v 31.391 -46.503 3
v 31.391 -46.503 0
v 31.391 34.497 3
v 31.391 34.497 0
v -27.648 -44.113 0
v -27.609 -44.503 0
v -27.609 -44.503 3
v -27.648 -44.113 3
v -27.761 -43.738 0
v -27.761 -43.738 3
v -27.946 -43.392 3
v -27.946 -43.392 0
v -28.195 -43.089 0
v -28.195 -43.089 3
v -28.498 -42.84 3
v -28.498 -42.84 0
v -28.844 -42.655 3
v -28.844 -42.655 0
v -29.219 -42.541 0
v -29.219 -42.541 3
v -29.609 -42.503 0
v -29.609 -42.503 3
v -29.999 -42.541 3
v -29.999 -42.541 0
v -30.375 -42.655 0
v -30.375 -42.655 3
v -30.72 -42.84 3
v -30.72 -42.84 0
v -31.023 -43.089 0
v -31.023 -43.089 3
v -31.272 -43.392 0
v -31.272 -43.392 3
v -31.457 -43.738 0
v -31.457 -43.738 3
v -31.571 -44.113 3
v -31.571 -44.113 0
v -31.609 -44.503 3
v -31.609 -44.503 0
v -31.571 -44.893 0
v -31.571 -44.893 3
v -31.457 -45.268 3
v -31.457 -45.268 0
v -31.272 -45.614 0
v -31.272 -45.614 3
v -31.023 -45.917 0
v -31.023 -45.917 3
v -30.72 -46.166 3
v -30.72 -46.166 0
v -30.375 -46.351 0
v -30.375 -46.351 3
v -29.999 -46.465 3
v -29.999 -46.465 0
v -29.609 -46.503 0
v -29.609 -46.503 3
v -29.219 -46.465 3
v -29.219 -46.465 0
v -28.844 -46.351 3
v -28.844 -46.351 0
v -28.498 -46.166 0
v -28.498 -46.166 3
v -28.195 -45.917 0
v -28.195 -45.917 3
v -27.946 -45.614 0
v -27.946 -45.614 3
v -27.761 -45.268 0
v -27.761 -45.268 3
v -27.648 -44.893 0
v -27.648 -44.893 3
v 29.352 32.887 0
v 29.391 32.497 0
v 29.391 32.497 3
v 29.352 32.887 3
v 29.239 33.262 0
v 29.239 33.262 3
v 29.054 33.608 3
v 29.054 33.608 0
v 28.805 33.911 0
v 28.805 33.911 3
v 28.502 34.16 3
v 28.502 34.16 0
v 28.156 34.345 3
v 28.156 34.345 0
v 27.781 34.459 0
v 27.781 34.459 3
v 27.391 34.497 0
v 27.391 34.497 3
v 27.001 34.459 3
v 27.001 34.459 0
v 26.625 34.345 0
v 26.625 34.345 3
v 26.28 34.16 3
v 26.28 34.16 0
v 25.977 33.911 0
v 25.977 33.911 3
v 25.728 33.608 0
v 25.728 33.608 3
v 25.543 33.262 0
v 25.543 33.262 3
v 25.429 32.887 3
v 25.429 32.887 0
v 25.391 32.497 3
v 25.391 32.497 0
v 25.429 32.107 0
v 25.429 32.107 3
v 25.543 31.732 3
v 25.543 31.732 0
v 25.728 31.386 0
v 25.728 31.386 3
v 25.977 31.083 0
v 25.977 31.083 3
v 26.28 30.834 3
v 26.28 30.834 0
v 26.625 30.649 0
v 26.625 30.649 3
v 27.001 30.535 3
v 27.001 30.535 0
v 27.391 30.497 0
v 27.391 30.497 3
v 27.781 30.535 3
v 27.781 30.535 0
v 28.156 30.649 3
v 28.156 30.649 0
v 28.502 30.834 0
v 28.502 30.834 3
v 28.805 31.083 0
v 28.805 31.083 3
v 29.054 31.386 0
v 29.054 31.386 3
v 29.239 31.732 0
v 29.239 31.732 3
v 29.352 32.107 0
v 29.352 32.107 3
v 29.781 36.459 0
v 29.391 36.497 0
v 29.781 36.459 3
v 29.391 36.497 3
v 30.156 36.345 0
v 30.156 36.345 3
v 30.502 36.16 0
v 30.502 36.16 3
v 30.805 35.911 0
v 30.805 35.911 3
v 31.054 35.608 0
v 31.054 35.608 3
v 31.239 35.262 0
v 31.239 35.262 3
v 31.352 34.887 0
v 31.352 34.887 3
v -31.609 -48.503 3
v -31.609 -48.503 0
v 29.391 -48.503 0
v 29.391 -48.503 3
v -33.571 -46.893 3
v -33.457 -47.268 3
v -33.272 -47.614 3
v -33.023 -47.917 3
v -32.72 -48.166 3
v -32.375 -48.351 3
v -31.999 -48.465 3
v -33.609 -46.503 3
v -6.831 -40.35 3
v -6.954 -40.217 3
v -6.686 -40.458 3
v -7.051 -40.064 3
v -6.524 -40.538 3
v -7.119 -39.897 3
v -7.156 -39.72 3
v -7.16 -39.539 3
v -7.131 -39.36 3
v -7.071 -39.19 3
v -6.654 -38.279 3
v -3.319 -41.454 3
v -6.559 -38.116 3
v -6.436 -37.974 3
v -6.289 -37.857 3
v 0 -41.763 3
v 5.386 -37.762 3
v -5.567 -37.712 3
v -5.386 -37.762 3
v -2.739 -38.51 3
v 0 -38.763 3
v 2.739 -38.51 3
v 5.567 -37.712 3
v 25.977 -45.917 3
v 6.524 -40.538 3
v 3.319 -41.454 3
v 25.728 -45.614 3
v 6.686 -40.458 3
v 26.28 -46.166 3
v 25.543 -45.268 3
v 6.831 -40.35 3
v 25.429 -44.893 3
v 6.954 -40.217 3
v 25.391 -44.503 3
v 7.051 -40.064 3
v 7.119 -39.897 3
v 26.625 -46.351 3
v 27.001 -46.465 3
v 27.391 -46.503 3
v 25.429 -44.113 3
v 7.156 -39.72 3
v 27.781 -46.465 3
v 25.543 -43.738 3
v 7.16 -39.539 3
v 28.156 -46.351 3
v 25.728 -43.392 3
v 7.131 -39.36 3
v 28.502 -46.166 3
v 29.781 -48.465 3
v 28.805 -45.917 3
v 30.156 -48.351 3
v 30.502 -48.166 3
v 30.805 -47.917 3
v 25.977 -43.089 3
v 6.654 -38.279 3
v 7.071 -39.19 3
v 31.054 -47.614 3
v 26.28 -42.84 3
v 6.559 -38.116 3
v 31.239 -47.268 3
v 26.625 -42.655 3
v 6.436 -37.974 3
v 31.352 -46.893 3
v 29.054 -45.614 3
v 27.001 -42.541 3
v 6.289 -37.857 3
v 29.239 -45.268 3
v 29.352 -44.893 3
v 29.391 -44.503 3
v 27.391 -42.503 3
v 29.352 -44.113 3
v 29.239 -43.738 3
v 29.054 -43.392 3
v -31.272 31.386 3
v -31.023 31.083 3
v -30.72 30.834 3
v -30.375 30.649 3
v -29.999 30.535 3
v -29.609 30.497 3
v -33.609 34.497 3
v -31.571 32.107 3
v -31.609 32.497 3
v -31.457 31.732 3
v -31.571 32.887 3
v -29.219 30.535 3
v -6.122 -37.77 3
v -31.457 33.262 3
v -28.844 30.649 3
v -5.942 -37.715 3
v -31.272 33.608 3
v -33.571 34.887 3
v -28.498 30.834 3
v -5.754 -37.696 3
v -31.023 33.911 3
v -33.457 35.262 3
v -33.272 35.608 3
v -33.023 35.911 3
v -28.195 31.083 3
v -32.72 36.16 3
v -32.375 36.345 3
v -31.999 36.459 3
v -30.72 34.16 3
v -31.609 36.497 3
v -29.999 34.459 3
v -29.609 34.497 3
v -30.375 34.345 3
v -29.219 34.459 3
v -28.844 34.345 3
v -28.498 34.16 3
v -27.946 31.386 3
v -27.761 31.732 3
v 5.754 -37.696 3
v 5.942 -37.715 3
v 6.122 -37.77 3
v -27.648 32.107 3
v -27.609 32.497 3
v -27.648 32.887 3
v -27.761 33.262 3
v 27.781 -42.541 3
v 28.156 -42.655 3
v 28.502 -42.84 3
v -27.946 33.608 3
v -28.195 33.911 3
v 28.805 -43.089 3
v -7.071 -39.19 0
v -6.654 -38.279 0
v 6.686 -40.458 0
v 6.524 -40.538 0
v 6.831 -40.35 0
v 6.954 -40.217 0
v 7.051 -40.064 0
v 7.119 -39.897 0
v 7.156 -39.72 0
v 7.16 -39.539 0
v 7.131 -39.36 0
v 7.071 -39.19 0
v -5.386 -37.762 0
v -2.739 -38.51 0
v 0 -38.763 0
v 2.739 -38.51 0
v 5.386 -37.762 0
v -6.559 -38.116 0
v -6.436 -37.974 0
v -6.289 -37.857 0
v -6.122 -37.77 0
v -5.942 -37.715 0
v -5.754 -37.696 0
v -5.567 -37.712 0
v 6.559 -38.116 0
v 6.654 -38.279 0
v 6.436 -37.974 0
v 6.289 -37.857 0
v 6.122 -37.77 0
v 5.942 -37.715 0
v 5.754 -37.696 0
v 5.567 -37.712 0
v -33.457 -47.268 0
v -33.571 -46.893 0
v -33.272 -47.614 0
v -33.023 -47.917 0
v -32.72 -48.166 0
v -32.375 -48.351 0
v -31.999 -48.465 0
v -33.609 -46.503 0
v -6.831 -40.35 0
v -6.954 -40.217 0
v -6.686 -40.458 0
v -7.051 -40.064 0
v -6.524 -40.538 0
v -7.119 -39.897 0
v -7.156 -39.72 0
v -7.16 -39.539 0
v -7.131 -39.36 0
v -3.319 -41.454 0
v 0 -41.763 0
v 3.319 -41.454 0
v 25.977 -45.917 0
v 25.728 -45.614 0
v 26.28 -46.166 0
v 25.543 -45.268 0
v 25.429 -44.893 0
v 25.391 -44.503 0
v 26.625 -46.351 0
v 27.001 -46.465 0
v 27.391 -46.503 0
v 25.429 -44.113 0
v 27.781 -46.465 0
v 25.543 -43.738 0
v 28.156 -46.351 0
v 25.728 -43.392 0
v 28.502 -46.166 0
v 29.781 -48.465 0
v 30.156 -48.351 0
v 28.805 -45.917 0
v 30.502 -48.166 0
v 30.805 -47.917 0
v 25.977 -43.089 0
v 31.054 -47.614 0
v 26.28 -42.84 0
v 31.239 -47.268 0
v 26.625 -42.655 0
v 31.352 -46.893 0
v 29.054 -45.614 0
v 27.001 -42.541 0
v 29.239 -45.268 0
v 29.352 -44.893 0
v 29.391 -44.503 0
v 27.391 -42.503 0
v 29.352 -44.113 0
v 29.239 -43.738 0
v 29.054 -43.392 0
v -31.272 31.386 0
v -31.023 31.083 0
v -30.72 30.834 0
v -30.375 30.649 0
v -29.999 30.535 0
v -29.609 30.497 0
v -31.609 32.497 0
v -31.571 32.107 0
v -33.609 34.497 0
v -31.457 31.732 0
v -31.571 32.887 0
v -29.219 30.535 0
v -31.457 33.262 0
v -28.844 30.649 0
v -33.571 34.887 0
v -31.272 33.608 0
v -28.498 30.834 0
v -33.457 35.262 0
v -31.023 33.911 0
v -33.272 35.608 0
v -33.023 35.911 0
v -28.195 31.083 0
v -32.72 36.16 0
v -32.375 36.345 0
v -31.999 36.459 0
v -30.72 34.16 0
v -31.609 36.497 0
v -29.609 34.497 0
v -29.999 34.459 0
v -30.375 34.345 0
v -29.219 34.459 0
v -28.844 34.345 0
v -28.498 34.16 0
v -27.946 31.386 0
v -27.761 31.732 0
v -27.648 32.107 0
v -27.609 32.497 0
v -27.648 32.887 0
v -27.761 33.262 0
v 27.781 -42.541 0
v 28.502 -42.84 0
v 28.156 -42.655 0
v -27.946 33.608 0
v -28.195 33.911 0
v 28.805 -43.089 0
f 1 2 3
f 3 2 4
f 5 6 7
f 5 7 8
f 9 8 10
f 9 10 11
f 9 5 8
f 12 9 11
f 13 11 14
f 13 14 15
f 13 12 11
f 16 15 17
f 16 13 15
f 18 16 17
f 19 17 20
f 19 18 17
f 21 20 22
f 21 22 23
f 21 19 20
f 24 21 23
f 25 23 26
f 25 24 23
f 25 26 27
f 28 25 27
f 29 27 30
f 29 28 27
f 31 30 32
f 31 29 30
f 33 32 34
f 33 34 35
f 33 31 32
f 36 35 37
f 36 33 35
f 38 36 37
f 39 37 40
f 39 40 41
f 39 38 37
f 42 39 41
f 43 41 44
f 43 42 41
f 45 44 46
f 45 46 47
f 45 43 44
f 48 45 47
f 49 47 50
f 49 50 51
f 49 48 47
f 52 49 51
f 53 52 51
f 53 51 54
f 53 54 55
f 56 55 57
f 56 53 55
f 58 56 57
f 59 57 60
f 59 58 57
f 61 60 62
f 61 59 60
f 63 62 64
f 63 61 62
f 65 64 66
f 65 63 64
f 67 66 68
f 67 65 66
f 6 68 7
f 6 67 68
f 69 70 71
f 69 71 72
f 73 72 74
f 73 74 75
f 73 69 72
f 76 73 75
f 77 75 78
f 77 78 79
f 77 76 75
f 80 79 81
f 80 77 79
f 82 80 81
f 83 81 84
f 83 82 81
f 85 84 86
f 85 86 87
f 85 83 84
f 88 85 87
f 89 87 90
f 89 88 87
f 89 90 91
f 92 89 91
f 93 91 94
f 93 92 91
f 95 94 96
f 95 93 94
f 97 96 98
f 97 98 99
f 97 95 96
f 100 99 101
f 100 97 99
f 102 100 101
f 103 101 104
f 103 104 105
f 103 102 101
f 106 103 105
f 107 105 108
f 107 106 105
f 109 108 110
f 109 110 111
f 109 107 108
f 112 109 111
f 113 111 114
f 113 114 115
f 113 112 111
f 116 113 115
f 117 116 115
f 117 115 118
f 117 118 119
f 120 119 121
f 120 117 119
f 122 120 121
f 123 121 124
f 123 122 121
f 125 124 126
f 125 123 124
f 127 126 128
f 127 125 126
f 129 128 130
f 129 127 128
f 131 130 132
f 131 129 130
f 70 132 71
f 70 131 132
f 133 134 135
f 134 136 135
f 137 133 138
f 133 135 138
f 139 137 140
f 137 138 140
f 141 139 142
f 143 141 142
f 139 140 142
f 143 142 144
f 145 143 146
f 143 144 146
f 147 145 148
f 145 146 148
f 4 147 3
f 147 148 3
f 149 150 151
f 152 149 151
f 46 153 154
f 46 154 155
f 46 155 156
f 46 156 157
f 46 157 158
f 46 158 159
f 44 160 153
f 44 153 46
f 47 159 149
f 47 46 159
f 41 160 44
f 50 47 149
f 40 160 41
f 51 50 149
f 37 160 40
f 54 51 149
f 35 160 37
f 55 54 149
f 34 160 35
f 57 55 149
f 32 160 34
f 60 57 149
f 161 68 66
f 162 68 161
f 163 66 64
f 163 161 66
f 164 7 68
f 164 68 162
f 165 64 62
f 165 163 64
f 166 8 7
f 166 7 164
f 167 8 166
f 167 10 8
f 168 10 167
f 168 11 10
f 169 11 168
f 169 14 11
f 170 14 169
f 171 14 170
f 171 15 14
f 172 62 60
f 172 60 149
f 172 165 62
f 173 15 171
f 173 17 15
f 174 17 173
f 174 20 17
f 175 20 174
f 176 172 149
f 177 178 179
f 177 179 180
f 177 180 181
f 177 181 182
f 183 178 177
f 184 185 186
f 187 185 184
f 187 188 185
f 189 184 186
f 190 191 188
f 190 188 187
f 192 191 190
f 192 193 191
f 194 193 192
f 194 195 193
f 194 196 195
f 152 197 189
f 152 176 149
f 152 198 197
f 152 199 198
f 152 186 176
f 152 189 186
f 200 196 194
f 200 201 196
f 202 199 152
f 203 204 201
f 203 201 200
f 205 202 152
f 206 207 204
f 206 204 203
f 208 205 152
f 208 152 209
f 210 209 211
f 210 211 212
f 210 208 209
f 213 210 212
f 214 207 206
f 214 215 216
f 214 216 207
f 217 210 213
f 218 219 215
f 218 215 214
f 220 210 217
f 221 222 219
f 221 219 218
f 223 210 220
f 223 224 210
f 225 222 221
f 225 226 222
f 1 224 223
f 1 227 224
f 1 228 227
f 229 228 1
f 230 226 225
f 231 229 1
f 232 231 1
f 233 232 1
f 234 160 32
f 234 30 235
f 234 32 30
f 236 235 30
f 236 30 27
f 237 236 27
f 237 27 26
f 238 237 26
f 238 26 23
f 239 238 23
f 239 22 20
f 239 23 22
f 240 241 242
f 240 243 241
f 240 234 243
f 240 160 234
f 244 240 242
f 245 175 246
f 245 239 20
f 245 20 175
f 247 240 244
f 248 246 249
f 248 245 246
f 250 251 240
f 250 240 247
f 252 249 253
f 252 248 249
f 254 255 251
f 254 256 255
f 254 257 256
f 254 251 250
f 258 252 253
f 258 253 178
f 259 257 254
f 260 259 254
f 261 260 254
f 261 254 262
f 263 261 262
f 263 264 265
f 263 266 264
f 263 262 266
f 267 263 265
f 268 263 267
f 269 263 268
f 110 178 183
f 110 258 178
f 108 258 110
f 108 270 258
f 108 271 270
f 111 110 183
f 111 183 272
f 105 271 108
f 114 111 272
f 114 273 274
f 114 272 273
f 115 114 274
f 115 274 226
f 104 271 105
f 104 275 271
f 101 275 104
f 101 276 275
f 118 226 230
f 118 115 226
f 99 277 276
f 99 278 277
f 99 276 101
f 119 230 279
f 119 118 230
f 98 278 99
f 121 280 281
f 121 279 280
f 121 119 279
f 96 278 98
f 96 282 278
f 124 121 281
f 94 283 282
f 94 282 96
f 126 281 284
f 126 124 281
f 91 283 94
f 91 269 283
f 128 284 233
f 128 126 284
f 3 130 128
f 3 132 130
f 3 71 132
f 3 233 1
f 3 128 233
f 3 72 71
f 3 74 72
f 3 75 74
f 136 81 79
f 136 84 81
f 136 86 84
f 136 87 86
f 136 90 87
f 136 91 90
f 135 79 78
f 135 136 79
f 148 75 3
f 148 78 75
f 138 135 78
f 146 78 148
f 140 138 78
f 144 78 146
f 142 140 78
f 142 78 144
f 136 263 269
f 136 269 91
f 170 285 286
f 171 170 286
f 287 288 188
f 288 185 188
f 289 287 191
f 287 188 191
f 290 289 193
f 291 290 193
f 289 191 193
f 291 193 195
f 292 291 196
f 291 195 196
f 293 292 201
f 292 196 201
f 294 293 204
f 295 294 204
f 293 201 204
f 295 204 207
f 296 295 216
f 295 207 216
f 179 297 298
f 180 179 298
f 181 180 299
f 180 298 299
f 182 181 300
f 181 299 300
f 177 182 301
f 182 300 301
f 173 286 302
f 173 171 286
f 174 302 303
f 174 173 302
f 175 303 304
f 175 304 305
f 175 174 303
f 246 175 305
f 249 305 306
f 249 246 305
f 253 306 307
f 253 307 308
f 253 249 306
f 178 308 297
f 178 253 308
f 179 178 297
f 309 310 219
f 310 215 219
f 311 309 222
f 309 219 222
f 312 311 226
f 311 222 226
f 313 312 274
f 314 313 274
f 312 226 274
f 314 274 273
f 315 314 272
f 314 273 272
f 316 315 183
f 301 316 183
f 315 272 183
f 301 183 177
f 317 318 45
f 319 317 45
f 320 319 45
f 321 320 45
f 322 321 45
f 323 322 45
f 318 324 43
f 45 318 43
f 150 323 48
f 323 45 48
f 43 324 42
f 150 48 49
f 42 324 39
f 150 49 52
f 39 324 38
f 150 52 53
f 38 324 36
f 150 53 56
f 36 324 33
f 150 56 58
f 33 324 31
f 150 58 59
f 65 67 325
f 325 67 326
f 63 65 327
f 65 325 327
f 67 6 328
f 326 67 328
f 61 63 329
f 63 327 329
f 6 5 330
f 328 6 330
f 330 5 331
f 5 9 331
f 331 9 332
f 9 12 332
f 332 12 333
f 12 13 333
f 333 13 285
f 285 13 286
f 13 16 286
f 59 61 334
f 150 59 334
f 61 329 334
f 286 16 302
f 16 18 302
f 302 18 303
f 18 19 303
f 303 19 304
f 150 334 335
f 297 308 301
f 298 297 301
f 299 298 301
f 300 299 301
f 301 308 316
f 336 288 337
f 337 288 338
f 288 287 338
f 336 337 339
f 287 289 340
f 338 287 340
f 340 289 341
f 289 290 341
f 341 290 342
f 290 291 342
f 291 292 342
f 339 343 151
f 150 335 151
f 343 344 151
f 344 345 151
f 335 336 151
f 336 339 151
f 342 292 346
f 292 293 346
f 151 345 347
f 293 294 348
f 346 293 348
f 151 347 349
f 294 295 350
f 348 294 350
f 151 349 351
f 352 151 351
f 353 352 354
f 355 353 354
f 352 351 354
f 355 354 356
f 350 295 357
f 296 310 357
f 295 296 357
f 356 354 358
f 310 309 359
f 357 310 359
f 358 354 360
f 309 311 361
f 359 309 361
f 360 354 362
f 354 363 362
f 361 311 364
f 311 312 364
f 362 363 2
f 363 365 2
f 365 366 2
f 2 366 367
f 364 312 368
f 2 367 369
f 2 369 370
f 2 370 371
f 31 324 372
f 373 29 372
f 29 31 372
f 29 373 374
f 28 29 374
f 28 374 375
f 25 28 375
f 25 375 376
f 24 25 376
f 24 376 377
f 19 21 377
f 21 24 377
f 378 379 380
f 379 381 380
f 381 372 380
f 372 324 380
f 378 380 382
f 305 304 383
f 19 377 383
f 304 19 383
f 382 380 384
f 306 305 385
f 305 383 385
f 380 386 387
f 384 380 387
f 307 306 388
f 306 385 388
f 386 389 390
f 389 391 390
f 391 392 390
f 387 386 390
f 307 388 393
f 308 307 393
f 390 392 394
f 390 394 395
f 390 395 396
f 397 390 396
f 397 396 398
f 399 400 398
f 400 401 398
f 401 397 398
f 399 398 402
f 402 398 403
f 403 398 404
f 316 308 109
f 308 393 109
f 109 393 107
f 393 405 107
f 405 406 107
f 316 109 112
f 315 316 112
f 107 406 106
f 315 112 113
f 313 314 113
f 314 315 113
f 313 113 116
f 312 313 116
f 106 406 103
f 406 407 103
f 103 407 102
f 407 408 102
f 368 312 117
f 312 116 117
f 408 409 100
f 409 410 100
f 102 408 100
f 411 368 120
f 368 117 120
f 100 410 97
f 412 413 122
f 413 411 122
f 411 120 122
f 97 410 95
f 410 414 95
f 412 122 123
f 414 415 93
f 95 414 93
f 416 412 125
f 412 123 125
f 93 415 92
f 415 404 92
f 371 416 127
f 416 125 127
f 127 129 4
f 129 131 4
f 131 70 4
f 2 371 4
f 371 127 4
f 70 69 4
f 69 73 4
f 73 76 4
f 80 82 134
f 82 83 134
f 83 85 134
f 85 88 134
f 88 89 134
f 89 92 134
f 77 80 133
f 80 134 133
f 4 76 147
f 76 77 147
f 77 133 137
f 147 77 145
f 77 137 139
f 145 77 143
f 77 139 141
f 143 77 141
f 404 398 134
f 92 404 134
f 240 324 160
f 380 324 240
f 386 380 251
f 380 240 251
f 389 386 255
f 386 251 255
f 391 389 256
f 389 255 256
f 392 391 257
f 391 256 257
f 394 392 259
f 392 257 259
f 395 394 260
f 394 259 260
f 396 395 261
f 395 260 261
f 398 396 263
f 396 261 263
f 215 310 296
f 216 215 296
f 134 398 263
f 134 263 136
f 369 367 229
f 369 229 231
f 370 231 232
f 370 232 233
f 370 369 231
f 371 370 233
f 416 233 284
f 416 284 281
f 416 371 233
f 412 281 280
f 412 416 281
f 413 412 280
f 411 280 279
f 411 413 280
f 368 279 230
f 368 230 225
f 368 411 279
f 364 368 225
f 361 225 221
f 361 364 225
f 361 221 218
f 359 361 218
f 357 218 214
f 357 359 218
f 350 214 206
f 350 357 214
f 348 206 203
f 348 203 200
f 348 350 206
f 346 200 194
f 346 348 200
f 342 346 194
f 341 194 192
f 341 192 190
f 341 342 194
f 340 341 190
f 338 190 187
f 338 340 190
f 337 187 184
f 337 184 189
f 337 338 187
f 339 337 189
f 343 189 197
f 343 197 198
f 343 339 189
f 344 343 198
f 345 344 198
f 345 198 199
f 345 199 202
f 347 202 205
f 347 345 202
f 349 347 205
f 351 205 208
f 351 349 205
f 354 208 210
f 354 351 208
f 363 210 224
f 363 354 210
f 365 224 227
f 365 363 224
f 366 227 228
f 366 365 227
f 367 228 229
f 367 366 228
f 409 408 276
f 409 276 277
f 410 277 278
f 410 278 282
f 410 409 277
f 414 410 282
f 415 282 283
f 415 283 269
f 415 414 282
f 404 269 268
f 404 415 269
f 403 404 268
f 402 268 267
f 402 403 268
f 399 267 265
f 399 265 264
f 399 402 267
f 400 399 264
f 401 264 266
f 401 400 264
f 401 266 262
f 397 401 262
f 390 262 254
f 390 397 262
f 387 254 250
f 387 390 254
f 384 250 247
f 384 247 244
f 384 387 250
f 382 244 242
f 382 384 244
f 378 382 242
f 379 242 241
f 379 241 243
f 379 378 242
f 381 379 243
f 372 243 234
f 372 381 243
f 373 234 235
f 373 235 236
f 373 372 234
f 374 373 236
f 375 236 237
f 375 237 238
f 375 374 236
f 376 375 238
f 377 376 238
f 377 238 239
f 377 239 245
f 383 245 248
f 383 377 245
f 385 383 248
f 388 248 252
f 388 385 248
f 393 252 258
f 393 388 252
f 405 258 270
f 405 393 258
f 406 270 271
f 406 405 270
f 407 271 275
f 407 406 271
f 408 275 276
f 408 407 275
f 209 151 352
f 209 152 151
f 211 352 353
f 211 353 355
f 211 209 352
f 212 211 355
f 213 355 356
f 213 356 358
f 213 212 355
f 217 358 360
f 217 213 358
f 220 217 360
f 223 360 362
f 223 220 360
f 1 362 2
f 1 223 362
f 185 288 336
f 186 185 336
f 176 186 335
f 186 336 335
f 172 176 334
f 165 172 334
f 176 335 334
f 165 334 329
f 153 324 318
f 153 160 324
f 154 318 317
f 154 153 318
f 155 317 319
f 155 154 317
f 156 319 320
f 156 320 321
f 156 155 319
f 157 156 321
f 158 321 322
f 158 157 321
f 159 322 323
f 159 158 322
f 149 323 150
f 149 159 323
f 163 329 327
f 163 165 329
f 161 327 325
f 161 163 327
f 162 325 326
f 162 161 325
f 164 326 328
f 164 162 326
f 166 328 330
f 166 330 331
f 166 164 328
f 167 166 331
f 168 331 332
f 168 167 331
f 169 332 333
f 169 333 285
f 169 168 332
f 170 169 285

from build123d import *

# Parameters (mm, degrees)
F0_W     = 65
F0_H     = 85
F0_R     = 2
F1_DEPTH = 3
F2_R     = 2
F3_R     = 1


with BuildPart() as f1:
    # F0 (on Top) → F1 (new body)
    with BuildSketch(Plane.XY):
        with Locations((-1.109155, -6.003008)):
            Rectangle(F0_W, F0_H)
        with Locations((-29.609155, -44.503008)):
            Circle(F0_R, mode=Mode.SUBTRACT)
        with BuildLine():
            Line((-7.5, -40.125584), (-6.25, -37.398406))
            ThreePointArc((-6.25, -37.398406), (0, -38.762516), (6.25, -37.398406))
            Line((6.25, -37.398406), (7.5, -40.125584))
            ThreePointArc((7.5, -40.125584), (0, -41.762516), (-7.5, -40.125584))
        make_face(mode=Mode.SUBTRACT)
        with Locations((27.390845, -44.503008)):
            Circle(F0_R, mode=Mode.SUBTRACT)
        with Locations((-29.609155, 32.496992)):
            Circle(F0_R, mode=Mode.SUBTRACT)
        with Locations((27.390845, 32.496992)):
            Circle(F0_R, mode=Mode.SUBTRACT)
    extrude(amount=F1_DEPTH)

    # F2
    f2_edges = [f1.edges().sort_by_distance(p)[0] for p in [
        (31.390845, 36.496992, 1.5),
        (31.390845, -48.503008, 1.5),
        (-33.609155, -48.503008, 1.5),
        (-33.609155, 36.496992, 1.5),
    ]]
    fillet(f2_edges, radius=F2_R)

    # F3
    f3_edges = [f1.edges().sort_by_distance(p)[0] for p in [
        (-7.5, -40.125584, 1.5),
        (-6.25, -37.398406, 1.5),
        (6.25, -37.398406, 1.5),
        (7.5, -40.125584, 1.5),
    ]]
    fillet(f3_edges, radius=F3_R)


solid = f1.part
